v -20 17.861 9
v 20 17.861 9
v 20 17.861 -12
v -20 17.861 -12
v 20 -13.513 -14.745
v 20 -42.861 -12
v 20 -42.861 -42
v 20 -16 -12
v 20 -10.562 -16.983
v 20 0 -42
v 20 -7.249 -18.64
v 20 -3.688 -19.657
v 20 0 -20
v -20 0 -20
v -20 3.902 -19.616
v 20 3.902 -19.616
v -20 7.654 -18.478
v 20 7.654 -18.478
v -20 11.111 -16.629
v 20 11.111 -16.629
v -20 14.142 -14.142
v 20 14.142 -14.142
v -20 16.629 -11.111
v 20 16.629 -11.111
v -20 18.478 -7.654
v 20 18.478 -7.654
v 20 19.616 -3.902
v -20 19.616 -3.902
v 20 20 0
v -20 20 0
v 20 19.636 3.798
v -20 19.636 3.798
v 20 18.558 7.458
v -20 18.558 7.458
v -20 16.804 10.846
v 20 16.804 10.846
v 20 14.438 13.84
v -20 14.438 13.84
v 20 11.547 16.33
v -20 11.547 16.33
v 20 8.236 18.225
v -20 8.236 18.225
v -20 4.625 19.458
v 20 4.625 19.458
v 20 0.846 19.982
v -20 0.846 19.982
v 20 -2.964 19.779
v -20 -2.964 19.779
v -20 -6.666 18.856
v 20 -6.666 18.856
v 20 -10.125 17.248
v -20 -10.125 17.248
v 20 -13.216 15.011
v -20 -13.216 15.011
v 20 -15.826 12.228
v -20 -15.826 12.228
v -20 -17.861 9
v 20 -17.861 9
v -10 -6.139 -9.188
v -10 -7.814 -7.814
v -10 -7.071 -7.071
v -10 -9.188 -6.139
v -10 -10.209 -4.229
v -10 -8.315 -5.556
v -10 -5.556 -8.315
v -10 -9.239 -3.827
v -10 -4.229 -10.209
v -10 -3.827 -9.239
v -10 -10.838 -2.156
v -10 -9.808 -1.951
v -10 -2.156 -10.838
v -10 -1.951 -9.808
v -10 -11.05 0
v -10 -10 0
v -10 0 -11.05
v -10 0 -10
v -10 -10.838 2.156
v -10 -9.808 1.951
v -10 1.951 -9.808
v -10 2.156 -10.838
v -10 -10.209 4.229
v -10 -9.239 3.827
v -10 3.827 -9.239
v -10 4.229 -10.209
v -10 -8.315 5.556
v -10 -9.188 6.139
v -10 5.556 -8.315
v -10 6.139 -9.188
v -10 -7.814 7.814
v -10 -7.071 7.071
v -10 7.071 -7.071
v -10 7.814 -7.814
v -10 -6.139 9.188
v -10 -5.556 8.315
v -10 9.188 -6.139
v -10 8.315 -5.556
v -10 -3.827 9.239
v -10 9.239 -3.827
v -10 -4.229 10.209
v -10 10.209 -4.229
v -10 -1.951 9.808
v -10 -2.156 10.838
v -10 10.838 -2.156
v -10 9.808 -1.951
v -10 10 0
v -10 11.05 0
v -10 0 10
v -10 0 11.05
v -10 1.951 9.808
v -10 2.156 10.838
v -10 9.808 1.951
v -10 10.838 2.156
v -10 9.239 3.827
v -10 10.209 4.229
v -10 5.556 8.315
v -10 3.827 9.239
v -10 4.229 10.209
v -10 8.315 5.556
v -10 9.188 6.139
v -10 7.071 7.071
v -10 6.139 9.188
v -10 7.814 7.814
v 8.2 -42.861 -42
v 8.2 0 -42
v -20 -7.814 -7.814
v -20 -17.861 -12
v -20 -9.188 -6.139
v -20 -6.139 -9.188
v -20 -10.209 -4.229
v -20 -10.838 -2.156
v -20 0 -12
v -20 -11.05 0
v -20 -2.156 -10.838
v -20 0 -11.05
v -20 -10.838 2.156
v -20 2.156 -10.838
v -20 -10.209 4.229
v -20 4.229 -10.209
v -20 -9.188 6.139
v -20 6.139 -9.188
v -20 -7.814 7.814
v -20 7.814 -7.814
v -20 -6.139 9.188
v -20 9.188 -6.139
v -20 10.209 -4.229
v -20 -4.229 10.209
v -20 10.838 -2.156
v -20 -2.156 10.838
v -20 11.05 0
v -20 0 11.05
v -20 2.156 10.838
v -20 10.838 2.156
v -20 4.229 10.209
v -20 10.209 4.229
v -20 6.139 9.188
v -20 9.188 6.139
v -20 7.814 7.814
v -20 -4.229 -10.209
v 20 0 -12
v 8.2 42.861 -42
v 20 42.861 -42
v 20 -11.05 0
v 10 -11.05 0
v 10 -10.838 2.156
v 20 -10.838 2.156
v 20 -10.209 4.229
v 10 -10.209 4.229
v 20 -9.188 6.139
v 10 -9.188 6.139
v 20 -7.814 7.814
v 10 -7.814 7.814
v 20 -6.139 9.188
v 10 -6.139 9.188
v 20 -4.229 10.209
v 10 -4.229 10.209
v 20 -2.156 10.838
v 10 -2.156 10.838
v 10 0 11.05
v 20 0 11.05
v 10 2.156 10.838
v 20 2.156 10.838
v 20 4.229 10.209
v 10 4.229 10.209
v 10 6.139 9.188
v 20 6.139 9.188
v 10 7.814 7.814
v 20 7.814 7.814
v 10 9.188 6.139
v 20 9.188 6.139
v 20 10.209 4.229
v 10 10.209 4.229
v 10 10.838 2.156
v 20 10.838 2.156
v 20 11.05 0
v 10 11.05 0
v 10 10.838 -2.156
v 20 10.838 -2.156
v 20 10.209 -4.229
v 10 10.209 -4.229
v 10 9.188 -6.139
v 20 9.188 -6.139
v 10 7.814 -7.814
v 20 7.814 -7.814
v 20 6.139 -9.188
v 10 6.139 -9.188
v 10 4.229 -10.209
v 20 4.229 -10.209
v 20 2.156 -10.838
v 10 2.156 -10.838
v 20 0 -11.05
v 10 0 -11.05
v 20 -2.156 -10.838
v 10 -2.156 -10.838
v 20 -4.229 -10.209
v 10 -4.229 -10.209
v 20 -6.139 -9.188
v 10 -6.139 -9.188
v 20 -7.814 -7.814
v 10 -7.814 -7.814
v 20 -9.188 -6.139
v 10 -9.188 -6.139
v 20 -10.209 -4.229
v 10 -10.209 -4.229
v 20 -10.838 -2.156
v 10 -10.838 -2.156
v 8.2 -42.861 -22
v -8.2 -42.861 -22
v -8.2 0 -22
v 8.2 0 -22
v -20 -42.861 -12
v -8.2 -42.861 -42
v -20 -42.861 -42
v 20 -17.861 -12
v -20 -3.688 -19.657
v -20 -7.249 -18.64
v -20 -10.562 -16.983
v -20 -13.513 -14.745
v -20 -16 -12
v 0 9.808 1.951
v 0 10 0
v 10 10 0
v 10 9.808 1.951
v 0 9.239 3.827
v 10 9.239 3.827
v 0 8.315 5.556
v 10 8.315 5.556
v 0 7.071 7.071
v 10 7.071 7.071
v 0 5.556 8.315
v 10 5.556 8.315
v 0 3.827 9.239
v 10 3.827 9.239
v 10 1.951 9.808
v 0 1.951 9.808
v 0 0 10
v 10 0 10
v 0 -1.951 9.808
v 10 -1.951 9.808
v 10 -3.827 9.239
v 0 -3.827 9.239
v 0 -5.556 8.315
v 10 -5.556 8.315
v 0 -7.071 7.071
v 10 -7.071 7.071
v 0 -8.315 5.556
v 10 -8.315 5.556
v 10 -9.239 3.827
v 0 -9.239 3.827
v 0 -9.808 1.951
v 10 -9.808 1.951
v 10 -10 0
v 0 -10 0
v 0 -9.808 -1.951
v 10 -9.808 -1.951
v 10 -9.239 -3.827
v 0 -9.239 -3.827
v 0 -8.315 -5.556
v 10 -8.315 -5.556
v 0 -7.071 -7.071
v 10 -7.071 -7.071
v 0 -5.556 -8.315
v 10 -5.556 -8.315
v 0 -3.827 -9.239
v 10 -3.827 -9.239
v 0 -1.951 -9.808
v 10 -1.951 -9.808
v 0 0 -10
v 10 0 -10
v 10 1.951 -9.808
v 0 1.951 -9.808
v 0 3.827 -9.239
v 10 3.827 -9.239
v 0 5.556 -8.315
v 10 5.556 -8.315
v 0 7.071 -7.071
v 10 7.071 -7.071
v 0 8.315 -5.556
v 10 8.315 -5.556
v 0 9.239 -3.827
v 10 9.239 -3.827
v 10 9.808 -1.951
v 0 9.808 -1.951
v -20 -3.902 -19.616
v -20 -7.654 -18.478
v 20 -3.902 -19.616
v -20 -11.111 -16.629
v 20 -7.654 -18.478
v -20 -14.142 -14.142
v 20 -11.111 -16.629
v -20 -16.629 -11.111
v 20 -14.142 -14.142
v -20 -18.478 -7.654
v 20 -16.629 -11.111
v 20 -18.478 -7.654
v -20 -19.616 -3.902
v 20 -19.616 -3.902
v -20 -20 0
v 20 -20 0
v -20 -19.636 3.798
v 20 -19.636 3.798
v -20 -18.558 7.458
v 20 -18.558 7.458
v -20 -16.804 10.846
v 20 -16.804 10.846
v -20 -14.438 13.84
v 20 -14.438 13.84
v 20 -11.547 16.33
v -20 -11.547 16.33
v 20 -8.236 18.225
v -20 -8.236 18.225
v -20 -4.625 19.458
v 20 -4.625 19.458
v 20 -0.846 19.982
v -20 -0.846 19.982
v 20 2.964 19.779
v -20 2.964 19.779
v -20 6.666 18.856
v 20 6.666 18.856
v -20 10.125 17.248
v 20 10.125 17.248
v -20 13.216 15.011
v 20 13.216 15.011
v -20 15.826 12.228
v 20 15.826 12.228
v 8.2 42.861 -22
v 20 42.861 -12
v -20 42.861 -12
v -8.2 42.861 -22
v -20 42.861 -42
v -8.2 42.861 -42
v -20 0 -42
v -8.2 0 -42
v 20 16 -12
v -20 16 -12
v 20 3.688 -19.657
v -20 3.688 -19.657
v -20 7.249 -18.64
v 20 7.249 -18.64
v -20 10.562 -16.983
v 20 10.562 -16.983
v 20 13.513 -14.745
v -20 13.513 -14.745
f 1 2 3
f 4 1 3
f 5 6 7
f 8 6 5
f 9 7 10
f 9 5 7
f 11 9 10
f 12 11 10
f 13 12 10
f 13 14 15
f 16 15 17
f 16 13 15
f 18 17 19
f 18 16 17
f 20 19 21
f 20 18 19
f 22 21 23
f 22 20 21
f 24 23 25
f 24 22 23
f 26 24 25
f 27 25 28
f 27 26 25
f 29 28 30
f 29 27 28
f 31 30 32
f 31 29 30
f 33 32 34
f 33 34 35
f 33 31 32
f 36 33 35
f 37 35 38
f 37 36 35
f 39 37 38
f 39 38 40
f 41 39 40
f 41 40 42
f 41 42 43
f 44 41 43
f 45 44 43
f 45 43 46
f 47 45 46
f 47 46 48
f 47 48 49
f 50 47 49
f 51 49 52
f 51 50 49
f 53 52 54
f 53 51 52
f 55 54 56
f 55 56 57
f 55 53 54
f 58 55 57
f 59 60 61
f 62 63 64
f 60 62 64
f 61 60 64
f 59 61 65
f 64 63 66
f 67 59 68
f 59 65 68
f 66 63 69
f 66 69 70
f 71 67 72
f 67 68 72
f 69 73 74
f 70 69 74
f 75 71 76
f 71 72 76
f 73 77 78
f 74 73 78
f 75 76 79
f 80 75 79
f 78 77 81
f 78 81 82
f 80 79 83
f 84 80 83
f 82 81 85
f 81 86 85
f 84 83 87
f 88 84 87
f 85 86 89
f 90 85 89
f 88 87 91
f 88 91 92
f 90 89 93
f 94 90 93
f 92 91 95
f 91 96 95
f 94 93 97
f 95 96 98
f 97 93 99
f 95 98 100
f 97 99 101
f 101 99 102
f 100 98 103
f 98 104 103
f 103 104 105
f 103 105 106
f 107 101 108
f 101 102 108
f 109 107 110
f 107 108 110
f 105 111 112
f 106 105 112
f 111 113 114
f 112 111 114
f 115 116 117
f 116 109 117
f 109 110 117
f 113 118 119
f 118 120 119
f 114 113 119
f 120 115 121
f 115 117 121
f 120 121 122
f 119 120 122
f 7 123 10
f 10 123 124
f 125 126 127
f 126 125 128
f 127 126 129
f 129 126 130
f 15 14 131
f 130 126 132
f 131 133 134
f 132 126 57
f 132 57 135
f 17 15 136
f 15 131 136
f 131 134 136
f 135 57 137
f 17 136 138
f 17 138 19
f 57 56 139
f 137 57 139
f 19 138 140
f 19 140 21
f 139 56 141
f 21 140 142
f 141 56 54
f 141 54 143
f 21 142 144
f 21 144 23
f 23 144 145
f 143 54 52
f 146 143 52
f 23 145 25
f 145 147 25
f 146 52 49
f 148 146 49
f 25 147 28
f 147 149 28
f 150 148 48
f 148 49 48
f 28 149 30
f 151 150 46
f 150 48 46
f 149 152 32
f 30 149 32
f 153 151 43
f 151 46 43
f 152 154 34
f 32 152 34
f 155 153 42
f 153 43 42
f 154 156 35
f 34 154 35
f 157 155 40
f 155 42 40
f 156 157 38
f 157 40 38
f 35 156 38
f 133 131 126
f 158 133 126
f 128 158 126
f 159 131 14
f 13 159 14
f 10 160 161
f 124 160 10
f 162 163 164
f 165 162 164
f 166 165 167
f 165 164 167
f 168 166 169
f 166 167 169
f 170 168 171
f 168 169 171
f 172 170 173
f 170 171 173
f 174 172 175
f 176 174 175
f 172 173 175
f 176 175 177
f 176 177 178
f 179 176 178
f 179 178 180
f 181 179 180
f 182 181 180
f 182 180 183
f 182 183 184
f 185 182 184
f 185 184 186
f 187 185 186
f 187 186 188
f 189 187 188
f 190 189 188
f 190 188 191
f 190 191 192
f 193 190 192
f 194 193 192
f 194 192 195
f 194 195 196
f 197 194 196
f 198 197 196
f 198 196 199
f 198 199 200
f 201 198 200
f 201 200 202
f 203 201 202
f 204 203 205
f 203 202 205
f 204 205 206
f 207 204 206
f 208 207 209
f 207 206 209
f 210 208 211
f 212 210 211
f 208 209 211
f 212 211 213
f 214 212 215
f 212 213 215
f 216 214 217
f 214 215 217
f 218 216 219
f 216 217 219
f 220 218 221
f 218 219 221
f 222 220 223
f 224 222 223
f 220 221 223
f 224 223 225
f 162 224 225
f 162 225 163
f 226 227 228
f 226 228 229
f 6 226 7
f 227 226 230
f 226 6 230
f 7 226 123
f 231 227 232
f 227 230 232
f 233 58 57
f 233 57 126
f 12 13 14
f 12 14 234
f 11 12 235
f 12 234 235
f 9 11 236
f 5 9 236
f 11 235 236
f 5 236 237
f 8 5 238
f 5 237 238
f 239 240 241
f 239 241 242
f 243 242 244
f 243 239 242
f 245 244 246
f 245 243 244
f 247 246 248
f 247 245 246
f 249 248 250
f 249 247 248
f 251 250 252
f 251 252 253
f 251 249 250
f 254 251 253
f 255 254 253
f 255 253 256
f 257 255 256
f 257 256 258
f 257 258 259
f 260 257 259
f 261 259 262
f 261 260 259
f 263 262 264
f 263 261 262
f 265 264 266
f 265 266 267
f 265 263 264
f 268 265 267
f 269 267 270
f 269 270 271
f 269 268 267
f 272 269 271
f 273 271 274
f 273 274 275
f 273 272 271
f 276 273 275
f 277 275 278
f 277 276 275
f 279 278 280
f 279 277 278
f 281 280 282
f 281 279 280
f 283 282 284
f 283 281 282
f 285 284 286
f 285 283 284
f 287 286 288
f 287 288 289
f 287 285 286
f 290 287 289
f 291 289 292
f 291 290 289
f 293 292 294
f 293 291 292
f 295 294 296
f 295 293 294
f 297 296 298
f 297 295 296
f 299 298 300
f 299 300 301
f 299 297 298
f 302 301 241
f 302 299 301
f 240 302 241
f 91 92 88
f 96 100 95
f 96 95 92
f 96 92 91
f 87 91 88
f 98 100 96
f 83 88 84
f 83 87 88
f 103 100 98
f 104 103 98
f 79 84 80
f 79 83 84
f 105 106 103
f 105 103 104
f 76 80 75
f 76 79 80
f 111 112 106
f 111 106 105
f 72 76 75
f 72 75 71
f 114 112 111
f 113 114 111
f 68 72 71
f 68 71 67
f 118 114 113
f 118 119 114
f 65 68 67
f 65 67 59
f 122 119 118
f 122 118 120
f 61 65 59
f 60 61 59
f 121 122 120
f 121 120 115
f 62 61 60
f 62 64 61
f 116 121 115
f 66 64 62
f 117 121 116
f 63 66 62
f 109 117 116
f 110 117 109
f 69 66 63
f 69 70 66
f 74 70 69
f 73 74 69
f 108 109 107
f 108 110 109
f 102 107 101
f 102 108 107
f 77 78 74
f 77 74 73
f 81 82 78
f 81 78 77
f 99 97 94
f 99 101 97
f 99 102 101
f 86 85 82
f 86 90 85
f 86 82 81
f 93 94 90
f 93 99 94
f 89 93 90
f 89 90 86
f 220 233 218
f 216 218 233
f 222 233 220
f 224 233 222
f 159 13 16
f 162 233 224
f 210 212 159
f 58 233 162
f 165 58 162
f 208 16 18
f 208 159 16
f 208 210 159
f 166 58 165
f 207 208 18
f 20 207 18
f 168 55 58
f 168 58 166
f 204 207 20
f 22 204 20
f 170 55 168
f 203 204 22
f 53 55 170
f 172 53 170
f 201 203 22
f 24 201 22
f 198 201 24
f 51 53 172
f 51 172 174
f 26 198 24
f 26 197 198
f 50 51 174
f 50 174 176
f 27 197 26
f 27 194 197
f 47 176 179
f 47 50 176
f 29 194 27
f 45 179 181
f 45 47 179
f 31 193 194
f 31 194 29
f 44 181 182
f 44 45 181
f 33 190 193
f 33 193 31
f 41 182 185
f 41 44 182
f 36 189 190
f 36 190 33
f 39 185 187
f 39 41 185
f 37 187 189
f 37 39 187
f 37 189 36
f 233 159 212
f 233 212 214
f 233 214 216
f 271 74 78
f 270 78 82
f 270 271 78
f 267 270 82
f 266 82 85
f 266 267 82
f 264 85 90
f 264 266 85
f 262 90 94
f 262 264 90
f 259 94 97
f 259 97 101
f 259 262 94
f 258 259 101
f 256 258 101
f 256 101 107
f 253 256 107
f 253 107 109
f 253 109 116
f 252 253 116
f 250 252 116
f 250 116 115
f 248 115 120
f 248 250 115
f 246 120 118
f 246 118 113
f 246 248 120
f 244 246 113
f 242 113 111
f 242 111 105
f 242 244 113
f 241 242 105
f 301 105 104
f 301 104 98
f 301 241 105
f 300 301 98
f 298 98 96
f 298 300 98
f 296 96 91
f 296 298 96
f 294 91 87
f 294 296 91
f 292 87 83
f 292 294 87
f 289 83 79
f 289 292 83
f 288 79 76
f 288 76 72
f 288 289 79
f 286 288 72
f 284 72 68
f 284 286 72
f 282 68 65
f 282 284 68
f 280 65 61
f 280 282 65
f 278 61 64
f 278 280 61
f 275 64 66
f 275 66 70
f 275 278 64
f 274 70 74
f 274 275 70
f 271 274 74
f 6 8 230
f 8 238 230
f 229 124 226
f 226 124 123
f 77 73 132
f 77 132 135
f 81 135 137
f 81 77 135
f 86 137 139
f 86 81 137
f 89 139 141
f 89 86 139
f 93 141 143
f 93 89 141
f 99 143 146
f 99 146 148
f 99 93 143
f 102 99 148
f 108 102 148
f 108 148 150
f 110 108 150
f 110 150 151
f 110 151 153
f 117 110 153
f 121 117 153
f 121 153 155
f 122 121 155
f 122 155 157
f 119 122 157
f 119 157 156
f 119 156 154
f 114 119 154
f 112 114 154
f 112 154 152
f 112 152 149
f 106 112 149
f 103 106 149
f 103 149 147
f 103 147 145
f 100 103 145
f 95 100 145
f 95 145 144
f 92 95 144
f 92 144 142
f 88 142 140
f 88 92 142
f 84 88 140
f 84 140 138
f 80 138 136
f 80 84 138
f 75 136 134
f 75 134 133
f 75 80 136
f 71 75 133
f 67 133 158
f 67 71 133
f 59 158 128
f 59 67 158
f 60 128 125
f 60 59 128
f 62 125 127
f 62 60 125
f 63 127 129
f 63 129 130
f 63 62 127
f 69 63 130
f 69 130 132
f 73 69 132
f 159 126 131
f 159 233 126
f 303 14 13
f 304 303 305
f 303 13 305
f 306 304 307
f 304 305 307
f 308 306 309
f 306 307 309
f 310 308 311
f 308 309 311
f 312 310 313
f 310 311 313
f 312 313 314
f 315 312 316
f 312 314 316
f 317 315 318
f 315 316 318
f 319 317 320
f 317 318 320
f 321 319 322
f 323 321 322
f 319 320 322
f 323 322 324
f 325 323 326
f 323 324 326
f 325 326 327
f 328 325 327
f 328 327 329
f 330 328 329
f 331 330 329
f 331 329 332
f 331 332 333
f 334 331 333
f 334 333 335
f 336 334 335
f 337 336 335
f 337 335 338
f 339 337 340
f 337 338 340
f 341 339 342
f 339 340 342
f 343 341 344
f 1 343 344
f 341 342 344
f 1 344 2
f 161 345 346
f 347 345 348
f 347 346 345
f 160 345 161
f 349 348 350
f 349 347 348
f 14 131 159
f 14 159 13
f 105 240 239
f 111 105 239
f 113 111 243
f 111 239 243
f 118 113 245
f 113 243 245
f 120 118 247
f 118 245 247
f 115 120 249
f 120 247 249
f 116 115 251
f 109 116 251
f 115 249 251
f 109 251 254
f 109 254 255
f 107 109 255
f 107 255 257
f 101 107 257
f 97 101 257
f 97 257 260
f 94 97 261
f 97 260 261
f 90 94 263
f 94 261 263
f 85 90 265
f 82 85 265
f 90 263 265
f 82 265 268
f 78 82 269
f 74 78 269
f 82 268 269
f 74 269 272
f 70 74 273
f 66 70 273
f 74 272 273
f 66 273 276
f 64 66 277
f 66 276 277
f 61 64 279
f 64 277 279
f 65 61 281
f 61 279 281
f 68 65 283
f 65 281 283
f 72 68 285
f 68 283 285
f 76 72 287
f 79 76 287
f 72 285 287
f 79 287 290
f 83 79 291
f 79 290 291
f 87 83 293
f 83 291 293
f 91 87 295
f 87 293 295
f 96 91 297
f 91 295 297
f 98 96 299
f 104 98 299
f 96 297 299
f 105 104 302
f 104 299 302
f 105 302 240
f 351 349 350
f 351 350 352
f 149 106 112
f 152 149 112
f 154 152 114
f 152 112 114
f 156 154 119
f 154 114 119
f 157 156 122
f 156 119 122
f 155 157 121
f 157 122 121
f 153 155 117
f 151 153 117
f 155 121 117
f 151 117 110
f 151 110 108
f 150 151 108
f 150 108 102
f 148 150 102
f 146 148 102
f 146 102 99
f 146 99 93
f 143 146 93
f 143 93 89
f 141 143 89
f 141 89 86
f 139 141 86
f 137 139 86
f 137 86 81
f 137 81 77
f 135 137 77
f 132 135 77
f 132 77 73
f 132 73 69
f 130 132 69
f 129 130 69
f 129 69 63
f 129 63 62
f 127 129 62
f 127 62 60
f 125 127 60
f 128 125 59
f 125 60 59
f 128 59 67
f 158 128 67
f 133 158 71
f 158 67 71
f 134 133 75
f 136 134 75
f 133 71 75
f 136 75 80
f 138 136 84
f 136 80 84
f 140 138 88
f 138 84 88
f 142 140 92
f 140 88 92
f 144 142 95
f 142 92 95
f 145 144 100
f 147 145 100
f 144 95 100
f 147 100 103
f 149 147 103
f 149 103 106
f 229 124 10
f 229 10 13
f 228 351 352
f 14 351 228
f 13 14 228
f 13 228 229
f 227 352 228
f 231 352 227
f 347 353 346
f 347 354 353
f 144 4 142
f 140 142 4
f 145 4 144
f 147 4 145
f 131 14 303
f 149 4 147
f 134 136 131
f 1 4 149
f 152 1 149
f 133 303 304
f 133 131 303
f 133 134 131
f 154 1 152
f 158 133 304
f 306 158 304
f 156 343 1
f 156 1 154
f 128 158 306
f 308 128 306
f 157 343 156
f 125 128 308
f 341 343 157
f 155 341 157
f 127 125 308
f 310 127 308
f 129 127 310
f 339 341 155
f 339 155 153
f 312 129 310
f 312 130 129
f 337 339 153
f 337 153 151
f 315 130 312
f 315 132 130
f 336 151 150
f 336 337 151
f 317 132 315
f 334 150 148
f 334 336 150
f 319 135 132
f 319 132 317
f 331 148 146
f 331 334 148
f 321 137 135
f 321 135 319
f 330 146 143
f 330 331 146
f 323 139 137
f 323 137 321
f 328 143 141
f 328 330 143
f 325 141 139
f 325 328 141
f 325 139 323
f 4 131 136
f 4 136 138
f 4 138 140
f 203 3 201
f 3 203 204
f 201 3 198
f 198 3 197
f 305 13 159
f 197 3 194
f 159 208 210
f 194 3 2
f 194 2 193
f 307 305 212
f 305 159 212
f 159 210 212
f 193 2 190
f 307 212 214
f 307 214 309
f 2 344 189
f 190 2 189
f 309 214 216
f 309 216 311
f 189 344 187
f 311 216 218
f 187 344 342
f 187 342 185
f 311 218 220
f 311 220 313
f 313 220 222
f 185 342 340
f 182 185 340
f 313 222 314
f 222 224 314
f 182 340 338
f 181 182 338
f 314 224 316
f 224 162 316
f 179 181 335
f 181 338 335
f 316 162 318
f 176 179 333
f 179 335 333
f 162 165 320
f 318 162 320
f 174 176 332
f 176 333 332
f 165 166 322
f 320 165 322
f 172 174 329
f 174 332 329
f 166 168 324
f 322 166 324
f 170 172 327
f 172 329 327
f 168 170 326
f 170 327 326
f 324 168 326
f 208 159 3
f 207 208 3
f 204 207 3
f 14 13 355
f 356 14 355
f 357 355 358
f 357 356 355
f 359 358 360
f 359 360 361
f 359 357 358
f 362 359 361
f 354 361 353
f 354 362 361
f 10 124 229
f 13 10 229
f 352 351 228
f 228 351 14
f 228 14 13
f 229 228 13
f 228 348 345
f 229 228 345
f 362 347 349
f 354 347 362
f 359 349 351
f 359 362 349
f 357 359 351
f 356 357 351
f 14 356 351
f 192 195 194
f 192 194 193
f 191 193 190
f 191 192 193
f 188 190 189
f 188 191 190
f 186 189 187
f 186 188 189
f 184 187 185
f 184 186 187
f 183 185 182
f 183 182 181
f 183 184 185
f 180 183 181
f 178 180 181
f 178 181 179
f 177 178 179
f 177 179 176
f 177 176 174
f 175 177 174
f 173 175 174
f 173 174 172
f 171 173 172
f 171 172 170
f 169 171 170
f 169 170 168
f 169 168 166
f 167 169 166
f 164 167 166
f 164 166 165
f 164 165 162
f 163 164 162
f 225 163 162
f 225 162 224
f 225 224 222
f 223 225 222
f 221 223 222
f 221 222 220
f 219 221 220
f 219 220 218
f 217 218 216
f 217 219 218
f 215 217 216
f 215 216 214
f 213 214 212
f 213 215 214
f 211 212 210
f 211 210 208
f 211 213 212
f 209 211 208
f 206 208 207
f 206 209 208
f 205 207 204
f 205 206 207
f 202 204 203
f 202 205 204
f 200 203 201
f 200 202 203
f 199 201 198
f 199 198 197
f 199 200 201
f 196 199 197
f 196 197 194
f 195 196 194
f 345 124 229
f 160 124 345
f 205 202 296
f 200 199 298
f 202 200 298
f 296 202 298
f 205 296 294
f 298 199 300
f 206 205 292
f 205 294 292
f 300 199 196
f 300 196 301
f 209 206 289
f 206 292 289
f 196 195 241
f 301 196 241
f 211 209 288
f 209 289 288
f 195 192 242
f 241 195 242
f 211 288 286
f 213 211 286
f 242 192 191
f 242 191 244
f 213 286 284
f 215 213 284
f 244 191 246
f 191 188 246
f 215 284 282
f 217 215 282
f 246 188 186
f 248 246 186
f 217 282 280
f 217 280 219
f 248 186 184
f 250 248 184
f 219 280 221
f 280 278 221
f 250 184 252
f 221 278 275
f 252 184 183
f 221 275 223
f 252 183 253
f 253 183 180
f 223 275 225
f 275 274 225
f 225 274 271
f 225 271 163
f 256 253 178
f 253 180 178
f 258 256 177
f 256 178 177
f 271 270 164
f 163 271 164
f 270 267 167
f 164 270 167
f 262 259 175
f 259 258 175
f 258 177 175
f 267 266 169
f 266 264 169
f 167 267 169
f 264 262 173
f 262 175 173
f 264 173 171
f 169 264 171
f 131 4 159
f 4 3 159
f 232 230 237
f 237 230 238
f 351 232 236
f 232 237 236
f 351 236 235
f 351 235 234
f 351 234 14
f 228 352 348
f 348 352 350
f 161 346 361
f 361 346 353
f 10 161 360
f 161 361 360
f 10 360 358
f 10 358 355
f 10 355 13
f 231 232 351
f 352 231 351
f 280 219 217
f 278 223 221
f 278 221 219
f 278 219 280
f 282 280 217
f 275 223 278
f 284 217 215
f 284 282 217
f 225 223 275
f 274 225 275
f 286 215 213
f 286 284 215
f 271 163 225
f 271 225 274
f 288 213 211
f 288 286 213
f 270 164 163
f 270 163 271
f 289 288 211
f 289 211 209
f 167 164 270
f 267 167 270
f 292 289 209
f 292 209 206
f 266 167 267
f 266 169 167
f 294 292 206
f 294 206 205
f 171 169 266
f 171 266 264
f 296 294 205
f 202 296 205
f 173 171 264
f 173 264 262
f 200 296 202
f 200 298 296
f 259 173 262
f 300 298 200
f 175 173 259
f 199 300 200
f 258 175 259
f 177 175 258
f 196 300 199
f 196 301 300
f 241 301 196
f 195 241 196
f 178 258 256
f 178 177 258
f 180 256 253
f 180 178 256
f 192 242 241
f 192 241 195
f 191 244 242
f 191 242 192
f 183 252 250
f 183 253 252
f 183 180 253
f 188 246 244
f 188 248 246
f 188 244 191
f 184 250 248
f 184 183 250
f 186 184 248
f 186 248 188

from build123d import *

# Parameters (mm, degrees)
F0_R          = 11.05
F1_DEPTH      = 20
F1_DEPTH_BACK = 20
F0_R_2        = 10
F2_DEPTH      = 10
F2_DEPTH_BACK = 10
F4_DEPTH      = 20
F4_DEPTH_BACK = 20
F5_W          = 16.4
F5_H          = 42.8605710995
F6_DEPTH      = 20


with BuildPart() as f1:
    # F0 (on Right) → F1 (new body, two sides)
    with BuildSketch(Plane.YZ) as f1_sk:
        with BuildLine():
            ThreePointArc((0, -20), (14.1421356237, -14.1421356237), (20, 0))
            ThreePointArc((20, 0), (4.6253960917, 19.4577930659), (-17.8605710995, 9))
            Line((-17.8605710995, 9), (-17.8605710995, -9))
            ThreePointArc((-17.8605710995, -9), (-16.9966046255, -10.5411304519), (-16, -12))
            Line((-16, -12), (0, -12))
            Line((0, -12), (0, -20))
        make_face()
        Circle(F0_R, mode=Mode.SUBTRACT)
        with BuildLine():
            ThreePointArc((-16, -12), (-16.9966046255, -10.5411304519), (-17.8605710995, -9))
            Line((-17.8605710995, -9), (-17.8605710995, -12))
            Line((-17.8605710995, -12), (-16, -12))
        make_face()
    extrude(amount=F1_DEPTH)
    extrude(f1_sk.sketch, amount=-F1_DEPTH_BACK)

    # F0 (on Right) → F2 (join, two sides)
    with BuildSketch(Plane.YZ) as f2_sk:
        Circle(F0_R)
        Circle(F0_R_2, mode=Mode.SUBTRACT)
    extrude(amount=F2_DEPTH)
    extrude(f2_sk.sketch, amount=-F2_DEPTH_BACK)


with BuildPart() as f3_1:
    # F3: instance of F1
    add(f1.part.mirror(Plane.XZ))


with BuildPart() as f4:
    # F0 (on Right) → F4 (new body, two sides)
    with BuildSketch(Plane.YZ) as f4_sk:
        with BuildLine():
            Line((0, -42), (0, -20))
            ThreePointArc((0, -20), (-8.94427191, -17.88854382), (-16, -12))
            Line((-16, -12), (-17.8605710995, -12))
            Line((-17.8605710995, -12), (-42.8605710995, -12))
            Line((-42.8605710995, -12), (-42.8605710995, -42))
            Line((-42.8605710995, -42), (0, -42))
        make_face()
    extrude(amount=-F4_DEPTH)
    extrude(f4_sk.sketch, amount=F4_DEPTH_BACK)

    # F5 (on face) → F6 (cut)
    with BuildSketch(Plane(origin=(0, 0, -42), x_dir=(1, 0, 0), z_dir=(0, 0, -1))):
        with Locations((0, 21.4302855497)):
            Rectangle(F5_W, F5_H)
    extrude(amount=-F6_DEPTH, mode=Mode.SUBTRACT)


with BuildPart() as f7_1:
    # F7: instance of F4
    add(f4.part.mirror(Plane.XZ))


solid = Compound([f1.part, f3_1.part, f4.part, f7_1.part])
